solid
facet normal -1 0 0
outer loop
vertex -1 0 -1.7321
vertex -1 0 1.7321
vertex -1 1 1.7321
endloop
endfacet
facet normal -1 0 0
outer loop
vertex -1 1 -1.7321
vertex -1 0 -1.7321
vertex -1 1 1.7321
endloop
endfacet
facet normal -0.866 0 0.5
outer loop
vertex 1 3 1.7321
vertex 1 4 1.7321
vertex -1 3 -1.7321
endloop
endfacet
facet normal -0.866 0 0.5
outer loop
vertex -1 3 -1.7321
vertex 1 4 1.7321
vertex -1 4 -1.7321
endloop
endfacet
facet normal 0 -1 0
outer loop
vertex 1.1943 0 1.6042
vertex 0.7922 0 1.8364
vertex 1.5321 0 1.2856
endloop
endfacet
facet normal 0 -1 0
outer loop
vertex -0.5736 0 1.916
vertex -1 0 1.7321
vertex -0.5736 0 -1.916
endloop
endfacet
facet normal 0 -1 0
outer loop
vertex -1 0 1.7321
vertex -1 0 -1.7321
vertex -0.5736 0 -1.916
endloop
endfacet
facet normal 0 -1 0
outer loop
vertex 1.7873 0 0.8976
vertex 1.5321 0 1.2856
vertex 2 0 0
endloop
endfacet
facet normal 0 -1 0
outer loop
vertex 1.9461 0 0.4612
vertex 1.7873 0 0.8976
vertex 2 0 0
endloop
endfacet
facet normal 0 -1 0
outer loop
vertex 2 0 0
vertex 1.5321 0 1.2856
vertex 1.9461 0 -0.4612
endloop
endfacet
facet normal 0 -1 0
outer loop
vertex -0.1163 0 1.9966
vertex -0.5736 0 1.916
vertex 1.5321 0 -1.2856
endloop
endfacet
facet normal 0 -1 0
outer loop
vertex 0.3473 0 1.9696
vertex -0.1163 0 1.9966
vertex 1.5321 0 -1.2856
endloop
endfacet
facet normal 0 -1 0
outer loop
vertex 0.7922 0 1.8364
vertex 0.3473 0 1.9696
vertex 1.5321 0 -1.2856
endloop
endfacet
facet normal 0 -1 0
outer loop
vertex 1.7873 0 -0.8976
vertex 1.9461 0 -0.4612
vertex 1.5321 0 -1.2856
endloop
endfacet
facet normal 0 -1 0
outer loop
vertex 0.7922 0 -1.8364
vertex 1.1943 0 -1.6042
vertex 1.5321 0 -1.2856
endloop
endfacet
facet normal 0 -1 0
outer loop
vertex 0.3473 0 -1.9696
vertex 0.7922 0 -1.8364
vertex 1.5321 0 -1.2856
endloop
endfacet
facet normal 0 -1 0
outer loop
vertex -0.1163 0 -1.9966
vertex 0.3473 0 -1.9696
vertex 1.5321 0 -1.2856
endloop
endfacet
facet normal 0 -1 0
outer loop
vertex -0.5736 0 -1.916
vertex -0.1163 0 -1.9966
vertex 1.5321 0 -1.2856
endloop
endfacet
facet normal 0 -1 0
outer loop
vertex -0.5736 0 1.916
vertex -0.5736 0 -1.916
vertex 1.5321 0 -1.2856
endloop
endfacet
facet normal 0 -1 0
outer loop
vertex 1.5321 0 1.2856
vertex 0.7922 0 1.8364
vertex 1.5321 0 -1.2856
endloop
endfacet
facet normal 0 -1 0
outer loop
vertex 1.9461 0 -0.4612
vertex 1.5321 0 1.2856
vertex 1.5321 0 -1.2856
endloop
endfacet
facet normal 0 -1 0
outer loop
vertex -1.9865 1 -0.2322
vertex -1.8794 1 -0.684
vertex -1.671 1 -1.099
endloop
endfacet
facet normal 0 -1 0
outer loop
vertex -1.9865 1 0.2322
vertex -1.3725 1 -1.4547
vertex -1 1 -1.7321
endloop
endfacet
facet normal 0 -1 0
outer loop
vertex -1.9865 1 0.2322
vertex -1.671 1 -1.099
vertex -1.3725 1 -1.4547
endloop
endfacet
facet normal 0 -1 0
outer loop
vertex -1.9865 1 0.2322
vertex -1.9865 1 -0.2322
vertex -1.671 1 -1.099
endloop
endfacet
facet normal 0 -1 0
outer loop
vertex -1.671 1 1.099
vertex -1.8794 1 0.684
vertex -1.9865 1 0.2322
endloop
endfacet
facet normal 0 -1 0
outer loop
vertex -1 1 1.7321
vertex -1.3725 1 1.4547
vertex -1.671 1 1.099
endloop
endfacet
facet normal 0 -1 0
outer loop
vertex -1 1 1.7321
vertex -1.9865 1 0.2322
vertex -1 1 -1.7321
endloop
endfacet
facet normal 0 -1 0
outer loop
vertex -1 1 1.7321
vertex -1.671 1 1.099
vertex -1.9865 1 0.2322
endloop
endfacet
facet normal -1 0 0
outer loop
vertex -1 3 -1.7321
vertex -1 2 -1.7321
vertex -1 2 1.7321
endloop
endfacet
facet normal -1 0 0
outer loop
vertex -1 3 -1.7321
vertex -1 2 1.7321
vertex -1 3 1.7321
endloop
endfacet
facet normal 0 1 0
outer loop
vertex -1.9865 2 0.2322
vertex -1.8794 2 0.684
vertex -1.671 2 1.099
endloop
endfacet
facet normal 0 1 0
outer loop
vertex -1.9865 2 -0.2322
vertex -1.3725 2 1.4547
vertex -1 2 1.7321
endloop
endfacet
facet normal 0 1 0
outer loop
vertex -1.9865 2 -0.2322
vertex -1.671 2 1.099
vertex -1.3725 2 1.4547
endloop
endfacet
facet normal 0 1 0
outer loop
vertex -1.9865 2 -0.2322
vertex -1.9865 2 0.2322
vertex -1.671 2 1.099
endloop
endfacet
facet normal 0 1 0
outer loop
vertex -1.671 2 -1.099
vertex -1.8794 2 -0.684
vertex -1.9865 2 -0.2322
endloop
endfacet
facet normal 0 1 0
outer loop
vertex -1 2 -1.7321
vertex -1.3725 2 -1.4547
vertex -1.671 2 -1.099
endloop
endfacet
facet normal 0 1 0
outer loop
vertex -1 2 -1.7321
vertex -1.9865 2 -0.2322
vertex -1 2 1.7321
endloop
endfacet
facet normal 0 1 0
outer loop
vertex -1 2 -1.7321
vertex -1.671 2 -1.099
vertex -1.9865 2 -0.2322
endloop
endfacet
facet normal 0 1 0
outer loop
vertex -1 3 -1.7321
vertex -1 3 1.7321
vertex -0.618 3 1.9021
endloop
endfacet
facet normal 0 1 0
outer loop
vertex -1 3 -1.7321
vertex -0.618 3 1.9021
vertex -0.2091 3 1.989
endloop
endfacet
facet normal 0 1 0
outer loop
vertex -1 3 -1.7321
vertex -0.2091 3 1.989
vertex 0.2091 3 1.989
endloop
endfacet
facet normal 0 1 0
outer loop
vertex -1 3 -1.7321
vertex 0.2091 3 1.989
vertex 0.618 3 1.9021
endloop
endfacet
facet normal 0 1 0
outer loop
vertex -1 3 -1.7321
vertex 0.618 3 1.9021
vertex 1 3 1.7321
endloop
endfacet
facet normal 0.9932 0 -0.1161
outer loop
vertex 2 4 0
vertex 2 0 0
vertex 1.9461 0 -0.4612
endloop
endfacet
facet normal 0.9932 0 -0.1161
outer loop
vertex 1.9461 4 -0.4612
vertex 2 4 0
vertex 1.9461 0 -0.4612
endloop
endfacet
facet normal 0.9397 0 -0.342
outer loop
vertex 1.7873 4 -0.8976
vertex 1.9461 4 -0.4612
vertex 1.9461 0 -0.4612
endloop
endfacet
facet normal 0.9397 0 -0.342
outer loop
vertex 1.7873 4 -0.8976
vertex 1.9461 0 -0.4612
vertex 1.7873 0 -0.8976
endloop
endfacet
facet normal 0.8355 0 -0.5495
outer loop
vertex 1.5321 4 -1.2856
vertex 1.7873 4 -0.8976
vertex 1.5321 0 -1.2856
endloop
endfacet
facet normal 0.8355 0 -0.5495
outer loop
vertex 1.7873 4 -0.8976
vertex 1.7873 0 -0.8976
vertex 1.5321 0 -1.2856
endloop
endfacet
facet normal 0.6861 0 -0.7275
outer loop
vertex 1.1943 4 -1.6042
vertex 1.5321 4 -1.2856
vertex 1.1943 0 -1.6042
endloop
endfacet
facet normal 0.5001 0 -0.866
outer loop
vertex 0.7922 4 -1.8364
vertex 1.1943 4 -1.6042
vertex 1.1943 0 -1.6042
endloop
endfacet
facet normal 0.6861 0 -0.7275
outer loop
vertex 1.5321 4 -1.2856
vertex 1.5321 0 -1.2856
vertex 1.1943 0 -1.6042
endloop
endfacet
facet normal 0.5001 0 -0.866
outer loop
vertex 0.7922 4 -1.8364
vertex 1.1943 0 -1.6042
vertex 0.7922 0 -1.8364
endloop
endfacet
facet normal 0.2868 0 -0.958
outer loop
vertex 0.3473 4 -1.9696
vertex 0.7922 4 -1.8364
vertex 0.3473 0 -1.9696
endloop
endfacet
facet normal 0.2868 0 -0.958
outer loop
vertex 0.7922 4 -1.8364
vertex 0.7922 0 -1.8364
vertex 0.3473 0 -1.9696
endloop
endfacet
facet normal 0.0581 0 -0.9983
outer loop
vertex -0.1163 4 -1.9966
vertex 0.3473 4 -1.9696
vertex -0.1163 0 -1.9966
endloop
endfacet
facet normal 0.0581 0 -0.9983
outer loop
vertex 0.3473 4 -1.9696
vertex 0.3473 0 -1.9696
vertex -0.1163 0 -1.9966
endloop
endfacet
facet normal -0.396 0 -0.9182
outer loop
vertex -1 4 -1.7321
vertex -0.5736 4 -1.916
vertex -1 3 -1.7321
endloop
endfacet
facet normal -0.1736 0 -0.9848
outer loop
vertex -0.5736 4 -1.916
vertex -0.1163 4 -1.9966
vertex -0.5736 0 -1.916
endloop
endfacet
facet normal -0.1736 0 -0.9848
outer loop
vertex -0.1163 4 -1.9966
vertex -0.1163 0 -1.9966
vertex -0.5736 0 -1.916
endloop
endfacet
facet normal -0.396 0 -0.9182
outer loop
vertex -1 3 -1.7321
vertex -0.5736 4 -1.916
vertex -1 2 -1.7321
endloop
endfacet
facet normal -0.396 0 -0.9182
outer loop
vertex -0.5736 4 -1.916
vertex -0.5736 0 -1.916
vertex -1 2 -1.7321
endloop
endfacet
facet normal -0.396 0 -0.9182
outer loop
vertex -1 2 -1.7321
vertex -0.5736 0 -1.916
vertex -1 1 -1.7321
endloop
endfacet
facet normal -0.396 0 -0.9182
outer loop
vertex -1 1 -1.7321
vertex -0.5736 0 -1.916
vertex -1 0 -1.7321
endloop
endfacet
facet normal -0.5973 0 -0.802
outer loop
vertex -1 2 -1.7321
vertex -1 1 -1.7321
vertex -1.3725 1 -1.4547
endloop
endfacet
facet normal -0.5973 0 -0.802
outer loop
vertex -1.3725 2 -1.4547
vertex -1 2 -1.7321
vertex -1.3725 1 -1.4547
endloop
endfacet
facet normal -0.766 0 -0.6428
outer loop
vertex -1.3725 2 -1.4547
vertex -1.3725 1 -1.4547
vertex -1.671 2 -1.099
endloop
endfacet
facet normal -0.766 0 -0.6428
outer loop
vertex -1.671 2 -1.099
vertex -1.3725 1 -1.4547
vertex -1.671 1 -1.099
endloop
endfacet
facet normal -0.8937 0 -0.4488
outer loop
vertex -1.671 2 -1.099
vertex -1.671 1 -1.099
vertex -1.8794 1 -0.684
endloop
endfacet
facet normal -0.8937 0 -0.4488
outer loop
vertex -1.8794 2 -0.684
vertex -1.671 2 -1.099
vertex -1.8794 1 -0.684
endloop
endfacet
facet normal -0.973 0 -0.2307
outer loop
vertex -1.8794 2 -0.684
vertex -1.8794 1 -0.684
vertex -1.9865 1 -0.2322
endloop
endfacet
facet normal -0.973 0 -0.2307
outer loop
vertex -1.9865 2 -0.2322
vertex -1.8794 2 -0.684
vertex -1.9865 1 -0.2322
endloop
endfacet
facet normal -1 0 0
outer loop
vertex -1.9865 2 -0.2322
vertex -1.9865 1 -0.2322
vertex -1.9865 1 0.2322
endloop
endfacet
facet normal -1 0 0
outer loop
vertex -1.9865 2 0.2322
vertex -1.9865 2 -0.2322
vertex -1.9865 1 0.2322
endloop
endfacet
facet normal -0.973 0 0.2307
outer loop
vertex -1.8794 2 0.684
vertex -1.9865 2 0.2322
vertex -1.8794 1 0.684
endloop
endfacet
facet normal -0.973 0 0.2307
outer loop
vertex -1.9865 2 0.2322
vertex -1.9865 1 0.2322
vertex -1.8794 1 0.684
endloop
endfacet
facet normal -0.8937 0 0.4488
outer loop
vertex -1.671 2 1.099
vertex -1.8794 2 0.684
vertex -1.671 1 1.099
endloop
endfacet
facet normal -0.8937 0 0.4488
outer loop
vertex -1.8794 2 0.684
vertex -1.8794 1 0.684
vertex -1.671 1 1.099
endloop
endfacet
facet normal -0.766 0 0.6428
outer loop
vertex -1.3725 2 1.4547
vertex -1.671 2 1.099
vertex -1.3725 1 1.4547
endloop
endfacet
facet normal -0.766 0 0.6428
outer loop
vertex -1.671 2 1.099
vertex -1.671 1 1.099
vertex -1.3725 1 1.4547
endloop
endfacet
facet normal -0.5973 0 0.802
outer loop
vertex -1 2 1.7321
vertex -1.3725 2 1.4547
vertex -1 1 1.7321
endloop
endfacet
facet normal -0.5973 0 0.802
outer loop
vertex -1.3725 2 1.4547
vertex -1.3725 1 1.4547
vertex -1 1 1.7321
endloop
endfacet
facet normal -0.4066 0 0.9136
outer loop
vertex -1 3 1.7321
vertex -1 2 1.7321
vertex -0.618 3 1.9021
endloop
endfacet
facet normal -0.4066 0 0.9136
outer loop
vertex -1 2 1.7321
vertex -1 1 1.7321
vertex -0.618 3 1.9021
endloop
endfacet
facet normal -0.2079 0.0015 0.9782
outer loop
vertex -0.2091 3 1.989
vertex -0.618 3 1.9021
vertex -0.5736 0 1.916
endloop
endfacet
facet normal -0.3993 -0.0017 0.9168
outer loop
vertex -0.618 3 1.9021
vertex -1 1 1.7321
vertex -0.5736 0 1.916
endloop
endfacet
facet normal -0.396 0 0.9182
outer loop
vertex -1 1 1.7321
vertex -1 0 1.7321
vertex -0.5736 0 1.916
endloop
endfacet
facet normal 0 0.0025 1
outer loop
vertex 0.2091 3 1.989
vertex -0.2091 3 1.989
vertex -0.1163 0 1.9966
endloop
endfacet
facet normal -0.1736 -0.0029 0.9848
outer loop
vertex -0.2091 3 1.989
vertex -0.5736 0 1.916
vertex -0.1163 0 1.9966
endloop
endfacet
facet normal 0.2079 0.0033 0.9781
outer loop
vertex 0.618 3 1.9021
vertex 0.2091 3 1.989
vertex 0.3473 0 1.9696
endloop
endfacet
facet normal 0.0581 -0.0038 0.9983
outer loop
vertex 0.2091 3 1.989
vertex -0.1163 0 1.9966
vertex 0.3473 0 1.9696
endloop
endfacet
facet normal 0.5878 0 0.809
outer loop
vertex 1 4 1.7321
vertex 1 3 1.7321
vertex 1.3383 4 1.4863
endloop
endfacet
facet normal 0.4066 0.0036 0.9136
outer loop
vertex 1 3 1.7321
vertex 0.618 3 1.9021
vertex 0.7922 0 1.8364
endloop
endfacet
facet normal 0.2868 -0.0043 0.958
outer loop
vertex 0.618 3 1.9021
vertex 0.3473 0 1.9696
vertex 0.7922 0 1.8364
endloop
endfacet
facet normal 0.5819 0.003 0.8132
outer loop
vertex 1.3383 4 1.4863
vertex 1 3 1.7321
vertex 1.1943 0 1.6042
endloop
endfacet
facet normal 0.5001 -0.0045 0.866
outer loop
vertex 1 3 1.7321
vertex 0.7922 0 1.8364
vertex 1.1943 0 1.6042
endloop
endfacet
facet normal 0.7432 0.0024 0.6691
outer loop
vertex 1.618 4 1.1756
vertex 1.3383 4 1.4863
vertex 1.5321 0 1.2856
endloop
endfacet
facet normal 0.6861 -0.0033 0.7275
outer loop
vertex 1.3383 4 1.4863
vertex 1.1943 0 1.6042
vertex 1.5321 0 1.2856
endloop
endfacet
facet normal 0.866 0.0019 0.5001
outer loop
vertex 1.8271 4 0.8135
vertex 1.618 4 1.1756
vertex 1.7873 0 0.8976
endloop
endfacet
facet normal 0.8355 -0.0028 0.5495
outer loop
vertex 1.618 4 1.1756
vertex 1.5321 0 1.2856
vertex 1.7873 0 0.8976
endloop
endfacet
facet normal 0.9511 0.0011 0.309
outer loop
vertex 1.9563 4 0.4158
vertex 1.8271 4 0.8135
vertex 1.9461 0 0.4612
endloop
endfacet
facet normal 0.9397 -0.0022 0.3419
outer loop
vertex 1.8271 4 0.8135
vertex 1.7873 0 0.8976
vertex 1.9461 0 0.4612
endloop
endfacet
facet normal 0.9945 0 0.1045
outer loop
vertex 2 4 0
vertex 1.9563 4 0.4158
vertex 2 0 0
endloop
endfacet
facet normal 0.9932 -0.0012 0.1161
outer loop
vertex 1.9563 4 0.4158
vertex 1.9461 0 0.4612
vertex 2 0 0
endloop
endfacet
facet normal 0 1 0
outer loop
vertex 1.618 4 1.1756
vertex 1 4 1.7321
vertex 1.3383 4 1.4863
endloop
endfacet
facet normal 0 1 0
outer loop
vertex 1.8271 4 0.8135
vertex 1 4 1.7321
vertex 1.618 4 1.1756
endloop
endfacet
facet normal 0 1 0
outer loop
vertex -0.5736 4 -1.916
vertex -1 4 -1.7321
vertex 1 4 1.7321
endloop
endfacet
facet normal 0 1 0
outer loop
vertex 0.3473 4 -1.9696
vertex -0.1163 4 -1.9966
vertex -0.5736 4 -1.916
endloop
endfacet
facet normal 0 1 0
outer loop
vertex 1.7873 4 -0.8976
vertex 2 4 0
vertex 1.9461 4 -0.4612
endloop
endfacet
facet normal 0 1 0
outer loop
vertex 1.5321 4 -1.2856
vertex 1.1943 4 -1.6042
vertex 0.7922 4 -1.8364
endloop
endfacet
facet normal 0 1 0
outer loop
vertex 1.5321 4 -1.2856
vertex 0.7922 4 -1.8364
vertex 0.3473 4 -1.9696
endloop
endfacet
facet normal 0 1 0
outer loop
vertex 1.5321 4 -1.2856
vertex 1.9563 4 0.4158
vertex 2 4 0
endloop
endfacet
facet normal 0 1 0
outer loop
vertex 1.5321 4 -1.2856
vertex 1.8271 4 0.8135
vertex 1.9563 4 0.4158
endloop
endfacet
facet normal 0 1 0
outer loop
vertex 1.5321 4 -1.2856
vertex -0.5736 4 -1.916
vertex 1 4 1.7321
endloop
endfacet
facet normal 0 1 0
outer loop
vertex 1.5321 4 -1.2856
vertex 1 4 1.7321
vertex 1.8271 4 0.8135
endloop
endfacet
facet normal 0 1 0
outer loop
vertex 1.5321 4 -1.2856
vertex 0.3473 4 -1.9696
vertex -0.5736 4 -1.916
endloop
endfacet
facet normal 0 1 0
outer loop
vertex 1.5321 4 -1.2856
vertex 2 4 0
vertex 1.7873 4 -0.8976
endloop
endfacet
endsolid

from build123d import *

# Parameters (mm, degrees)
SKETCH1_R               = 2
BOSS_EXTRUDE1_DEPTH     = 4
SKETCH2_W               = 1
SKETCH2_H               = 2
SKETCH2_H_2             = 1
CUT_EXTRUDE1_DEPTH      = 2
CUT_EXTRUDE4_DEPTH      = 1
CUT_EXTRUDE4_DEPTH_BACK = 1


with BuildPart() as part:
    # Sketch1 → Boss-Extrude1 (new body)
    with BuildSketch(Plane(origin=(0, 0, 0), x_dir=(1, 0, 0), z_dir=(0, 1, 0))):
        Circle(SKETCH1_R)
    extrude(amount=BOSS_EXTRUDE1_DEPTH)

    # Sketch2 → Cut-Extrude1 (cut, symmetric)
    with BuildSketch(Plane.XY):
        with Locations((-1.5, 3)):
            Rectangle(SKETCH2_W, SKETCH2_H)
        with Locations((-1.5, 0.5)):
            Rectangle(SKETCH2_W, SKETCH2_H_2)
    extrude(amount=CUT_EXTRUDE1_DEPTH, both=True, mode=Mode.SUBTRACT)

    # Sketch3 → Cut-Extrude4 (cut, two sides)
    with BuildSketch(Plane(origin=(0, 4, 0), x_dir=(1, 0, 0), z_dir=(0, 1, 0))) as cut_extrude4_sk:
        with BuildLine():
            ThreePointArc((-1, -1.732050808), (0, -2), (1, -1.732050808))
            Line((1, -1.732050808), (-1, 1.732050808))
            Line((-1, 1.732050808), (-1, -1.732050808))
        make_face()
    extrude(amount=CUT_EXTRUDE4_DEPTH, mode=Mode.SUBTRACT)
    extrude(cut_extrude4_sk.sketch, amount=-CUT_EXTRUDE4_DEPTH_BACK, mode=Mode.SUBTRACT)


solid = part.part
